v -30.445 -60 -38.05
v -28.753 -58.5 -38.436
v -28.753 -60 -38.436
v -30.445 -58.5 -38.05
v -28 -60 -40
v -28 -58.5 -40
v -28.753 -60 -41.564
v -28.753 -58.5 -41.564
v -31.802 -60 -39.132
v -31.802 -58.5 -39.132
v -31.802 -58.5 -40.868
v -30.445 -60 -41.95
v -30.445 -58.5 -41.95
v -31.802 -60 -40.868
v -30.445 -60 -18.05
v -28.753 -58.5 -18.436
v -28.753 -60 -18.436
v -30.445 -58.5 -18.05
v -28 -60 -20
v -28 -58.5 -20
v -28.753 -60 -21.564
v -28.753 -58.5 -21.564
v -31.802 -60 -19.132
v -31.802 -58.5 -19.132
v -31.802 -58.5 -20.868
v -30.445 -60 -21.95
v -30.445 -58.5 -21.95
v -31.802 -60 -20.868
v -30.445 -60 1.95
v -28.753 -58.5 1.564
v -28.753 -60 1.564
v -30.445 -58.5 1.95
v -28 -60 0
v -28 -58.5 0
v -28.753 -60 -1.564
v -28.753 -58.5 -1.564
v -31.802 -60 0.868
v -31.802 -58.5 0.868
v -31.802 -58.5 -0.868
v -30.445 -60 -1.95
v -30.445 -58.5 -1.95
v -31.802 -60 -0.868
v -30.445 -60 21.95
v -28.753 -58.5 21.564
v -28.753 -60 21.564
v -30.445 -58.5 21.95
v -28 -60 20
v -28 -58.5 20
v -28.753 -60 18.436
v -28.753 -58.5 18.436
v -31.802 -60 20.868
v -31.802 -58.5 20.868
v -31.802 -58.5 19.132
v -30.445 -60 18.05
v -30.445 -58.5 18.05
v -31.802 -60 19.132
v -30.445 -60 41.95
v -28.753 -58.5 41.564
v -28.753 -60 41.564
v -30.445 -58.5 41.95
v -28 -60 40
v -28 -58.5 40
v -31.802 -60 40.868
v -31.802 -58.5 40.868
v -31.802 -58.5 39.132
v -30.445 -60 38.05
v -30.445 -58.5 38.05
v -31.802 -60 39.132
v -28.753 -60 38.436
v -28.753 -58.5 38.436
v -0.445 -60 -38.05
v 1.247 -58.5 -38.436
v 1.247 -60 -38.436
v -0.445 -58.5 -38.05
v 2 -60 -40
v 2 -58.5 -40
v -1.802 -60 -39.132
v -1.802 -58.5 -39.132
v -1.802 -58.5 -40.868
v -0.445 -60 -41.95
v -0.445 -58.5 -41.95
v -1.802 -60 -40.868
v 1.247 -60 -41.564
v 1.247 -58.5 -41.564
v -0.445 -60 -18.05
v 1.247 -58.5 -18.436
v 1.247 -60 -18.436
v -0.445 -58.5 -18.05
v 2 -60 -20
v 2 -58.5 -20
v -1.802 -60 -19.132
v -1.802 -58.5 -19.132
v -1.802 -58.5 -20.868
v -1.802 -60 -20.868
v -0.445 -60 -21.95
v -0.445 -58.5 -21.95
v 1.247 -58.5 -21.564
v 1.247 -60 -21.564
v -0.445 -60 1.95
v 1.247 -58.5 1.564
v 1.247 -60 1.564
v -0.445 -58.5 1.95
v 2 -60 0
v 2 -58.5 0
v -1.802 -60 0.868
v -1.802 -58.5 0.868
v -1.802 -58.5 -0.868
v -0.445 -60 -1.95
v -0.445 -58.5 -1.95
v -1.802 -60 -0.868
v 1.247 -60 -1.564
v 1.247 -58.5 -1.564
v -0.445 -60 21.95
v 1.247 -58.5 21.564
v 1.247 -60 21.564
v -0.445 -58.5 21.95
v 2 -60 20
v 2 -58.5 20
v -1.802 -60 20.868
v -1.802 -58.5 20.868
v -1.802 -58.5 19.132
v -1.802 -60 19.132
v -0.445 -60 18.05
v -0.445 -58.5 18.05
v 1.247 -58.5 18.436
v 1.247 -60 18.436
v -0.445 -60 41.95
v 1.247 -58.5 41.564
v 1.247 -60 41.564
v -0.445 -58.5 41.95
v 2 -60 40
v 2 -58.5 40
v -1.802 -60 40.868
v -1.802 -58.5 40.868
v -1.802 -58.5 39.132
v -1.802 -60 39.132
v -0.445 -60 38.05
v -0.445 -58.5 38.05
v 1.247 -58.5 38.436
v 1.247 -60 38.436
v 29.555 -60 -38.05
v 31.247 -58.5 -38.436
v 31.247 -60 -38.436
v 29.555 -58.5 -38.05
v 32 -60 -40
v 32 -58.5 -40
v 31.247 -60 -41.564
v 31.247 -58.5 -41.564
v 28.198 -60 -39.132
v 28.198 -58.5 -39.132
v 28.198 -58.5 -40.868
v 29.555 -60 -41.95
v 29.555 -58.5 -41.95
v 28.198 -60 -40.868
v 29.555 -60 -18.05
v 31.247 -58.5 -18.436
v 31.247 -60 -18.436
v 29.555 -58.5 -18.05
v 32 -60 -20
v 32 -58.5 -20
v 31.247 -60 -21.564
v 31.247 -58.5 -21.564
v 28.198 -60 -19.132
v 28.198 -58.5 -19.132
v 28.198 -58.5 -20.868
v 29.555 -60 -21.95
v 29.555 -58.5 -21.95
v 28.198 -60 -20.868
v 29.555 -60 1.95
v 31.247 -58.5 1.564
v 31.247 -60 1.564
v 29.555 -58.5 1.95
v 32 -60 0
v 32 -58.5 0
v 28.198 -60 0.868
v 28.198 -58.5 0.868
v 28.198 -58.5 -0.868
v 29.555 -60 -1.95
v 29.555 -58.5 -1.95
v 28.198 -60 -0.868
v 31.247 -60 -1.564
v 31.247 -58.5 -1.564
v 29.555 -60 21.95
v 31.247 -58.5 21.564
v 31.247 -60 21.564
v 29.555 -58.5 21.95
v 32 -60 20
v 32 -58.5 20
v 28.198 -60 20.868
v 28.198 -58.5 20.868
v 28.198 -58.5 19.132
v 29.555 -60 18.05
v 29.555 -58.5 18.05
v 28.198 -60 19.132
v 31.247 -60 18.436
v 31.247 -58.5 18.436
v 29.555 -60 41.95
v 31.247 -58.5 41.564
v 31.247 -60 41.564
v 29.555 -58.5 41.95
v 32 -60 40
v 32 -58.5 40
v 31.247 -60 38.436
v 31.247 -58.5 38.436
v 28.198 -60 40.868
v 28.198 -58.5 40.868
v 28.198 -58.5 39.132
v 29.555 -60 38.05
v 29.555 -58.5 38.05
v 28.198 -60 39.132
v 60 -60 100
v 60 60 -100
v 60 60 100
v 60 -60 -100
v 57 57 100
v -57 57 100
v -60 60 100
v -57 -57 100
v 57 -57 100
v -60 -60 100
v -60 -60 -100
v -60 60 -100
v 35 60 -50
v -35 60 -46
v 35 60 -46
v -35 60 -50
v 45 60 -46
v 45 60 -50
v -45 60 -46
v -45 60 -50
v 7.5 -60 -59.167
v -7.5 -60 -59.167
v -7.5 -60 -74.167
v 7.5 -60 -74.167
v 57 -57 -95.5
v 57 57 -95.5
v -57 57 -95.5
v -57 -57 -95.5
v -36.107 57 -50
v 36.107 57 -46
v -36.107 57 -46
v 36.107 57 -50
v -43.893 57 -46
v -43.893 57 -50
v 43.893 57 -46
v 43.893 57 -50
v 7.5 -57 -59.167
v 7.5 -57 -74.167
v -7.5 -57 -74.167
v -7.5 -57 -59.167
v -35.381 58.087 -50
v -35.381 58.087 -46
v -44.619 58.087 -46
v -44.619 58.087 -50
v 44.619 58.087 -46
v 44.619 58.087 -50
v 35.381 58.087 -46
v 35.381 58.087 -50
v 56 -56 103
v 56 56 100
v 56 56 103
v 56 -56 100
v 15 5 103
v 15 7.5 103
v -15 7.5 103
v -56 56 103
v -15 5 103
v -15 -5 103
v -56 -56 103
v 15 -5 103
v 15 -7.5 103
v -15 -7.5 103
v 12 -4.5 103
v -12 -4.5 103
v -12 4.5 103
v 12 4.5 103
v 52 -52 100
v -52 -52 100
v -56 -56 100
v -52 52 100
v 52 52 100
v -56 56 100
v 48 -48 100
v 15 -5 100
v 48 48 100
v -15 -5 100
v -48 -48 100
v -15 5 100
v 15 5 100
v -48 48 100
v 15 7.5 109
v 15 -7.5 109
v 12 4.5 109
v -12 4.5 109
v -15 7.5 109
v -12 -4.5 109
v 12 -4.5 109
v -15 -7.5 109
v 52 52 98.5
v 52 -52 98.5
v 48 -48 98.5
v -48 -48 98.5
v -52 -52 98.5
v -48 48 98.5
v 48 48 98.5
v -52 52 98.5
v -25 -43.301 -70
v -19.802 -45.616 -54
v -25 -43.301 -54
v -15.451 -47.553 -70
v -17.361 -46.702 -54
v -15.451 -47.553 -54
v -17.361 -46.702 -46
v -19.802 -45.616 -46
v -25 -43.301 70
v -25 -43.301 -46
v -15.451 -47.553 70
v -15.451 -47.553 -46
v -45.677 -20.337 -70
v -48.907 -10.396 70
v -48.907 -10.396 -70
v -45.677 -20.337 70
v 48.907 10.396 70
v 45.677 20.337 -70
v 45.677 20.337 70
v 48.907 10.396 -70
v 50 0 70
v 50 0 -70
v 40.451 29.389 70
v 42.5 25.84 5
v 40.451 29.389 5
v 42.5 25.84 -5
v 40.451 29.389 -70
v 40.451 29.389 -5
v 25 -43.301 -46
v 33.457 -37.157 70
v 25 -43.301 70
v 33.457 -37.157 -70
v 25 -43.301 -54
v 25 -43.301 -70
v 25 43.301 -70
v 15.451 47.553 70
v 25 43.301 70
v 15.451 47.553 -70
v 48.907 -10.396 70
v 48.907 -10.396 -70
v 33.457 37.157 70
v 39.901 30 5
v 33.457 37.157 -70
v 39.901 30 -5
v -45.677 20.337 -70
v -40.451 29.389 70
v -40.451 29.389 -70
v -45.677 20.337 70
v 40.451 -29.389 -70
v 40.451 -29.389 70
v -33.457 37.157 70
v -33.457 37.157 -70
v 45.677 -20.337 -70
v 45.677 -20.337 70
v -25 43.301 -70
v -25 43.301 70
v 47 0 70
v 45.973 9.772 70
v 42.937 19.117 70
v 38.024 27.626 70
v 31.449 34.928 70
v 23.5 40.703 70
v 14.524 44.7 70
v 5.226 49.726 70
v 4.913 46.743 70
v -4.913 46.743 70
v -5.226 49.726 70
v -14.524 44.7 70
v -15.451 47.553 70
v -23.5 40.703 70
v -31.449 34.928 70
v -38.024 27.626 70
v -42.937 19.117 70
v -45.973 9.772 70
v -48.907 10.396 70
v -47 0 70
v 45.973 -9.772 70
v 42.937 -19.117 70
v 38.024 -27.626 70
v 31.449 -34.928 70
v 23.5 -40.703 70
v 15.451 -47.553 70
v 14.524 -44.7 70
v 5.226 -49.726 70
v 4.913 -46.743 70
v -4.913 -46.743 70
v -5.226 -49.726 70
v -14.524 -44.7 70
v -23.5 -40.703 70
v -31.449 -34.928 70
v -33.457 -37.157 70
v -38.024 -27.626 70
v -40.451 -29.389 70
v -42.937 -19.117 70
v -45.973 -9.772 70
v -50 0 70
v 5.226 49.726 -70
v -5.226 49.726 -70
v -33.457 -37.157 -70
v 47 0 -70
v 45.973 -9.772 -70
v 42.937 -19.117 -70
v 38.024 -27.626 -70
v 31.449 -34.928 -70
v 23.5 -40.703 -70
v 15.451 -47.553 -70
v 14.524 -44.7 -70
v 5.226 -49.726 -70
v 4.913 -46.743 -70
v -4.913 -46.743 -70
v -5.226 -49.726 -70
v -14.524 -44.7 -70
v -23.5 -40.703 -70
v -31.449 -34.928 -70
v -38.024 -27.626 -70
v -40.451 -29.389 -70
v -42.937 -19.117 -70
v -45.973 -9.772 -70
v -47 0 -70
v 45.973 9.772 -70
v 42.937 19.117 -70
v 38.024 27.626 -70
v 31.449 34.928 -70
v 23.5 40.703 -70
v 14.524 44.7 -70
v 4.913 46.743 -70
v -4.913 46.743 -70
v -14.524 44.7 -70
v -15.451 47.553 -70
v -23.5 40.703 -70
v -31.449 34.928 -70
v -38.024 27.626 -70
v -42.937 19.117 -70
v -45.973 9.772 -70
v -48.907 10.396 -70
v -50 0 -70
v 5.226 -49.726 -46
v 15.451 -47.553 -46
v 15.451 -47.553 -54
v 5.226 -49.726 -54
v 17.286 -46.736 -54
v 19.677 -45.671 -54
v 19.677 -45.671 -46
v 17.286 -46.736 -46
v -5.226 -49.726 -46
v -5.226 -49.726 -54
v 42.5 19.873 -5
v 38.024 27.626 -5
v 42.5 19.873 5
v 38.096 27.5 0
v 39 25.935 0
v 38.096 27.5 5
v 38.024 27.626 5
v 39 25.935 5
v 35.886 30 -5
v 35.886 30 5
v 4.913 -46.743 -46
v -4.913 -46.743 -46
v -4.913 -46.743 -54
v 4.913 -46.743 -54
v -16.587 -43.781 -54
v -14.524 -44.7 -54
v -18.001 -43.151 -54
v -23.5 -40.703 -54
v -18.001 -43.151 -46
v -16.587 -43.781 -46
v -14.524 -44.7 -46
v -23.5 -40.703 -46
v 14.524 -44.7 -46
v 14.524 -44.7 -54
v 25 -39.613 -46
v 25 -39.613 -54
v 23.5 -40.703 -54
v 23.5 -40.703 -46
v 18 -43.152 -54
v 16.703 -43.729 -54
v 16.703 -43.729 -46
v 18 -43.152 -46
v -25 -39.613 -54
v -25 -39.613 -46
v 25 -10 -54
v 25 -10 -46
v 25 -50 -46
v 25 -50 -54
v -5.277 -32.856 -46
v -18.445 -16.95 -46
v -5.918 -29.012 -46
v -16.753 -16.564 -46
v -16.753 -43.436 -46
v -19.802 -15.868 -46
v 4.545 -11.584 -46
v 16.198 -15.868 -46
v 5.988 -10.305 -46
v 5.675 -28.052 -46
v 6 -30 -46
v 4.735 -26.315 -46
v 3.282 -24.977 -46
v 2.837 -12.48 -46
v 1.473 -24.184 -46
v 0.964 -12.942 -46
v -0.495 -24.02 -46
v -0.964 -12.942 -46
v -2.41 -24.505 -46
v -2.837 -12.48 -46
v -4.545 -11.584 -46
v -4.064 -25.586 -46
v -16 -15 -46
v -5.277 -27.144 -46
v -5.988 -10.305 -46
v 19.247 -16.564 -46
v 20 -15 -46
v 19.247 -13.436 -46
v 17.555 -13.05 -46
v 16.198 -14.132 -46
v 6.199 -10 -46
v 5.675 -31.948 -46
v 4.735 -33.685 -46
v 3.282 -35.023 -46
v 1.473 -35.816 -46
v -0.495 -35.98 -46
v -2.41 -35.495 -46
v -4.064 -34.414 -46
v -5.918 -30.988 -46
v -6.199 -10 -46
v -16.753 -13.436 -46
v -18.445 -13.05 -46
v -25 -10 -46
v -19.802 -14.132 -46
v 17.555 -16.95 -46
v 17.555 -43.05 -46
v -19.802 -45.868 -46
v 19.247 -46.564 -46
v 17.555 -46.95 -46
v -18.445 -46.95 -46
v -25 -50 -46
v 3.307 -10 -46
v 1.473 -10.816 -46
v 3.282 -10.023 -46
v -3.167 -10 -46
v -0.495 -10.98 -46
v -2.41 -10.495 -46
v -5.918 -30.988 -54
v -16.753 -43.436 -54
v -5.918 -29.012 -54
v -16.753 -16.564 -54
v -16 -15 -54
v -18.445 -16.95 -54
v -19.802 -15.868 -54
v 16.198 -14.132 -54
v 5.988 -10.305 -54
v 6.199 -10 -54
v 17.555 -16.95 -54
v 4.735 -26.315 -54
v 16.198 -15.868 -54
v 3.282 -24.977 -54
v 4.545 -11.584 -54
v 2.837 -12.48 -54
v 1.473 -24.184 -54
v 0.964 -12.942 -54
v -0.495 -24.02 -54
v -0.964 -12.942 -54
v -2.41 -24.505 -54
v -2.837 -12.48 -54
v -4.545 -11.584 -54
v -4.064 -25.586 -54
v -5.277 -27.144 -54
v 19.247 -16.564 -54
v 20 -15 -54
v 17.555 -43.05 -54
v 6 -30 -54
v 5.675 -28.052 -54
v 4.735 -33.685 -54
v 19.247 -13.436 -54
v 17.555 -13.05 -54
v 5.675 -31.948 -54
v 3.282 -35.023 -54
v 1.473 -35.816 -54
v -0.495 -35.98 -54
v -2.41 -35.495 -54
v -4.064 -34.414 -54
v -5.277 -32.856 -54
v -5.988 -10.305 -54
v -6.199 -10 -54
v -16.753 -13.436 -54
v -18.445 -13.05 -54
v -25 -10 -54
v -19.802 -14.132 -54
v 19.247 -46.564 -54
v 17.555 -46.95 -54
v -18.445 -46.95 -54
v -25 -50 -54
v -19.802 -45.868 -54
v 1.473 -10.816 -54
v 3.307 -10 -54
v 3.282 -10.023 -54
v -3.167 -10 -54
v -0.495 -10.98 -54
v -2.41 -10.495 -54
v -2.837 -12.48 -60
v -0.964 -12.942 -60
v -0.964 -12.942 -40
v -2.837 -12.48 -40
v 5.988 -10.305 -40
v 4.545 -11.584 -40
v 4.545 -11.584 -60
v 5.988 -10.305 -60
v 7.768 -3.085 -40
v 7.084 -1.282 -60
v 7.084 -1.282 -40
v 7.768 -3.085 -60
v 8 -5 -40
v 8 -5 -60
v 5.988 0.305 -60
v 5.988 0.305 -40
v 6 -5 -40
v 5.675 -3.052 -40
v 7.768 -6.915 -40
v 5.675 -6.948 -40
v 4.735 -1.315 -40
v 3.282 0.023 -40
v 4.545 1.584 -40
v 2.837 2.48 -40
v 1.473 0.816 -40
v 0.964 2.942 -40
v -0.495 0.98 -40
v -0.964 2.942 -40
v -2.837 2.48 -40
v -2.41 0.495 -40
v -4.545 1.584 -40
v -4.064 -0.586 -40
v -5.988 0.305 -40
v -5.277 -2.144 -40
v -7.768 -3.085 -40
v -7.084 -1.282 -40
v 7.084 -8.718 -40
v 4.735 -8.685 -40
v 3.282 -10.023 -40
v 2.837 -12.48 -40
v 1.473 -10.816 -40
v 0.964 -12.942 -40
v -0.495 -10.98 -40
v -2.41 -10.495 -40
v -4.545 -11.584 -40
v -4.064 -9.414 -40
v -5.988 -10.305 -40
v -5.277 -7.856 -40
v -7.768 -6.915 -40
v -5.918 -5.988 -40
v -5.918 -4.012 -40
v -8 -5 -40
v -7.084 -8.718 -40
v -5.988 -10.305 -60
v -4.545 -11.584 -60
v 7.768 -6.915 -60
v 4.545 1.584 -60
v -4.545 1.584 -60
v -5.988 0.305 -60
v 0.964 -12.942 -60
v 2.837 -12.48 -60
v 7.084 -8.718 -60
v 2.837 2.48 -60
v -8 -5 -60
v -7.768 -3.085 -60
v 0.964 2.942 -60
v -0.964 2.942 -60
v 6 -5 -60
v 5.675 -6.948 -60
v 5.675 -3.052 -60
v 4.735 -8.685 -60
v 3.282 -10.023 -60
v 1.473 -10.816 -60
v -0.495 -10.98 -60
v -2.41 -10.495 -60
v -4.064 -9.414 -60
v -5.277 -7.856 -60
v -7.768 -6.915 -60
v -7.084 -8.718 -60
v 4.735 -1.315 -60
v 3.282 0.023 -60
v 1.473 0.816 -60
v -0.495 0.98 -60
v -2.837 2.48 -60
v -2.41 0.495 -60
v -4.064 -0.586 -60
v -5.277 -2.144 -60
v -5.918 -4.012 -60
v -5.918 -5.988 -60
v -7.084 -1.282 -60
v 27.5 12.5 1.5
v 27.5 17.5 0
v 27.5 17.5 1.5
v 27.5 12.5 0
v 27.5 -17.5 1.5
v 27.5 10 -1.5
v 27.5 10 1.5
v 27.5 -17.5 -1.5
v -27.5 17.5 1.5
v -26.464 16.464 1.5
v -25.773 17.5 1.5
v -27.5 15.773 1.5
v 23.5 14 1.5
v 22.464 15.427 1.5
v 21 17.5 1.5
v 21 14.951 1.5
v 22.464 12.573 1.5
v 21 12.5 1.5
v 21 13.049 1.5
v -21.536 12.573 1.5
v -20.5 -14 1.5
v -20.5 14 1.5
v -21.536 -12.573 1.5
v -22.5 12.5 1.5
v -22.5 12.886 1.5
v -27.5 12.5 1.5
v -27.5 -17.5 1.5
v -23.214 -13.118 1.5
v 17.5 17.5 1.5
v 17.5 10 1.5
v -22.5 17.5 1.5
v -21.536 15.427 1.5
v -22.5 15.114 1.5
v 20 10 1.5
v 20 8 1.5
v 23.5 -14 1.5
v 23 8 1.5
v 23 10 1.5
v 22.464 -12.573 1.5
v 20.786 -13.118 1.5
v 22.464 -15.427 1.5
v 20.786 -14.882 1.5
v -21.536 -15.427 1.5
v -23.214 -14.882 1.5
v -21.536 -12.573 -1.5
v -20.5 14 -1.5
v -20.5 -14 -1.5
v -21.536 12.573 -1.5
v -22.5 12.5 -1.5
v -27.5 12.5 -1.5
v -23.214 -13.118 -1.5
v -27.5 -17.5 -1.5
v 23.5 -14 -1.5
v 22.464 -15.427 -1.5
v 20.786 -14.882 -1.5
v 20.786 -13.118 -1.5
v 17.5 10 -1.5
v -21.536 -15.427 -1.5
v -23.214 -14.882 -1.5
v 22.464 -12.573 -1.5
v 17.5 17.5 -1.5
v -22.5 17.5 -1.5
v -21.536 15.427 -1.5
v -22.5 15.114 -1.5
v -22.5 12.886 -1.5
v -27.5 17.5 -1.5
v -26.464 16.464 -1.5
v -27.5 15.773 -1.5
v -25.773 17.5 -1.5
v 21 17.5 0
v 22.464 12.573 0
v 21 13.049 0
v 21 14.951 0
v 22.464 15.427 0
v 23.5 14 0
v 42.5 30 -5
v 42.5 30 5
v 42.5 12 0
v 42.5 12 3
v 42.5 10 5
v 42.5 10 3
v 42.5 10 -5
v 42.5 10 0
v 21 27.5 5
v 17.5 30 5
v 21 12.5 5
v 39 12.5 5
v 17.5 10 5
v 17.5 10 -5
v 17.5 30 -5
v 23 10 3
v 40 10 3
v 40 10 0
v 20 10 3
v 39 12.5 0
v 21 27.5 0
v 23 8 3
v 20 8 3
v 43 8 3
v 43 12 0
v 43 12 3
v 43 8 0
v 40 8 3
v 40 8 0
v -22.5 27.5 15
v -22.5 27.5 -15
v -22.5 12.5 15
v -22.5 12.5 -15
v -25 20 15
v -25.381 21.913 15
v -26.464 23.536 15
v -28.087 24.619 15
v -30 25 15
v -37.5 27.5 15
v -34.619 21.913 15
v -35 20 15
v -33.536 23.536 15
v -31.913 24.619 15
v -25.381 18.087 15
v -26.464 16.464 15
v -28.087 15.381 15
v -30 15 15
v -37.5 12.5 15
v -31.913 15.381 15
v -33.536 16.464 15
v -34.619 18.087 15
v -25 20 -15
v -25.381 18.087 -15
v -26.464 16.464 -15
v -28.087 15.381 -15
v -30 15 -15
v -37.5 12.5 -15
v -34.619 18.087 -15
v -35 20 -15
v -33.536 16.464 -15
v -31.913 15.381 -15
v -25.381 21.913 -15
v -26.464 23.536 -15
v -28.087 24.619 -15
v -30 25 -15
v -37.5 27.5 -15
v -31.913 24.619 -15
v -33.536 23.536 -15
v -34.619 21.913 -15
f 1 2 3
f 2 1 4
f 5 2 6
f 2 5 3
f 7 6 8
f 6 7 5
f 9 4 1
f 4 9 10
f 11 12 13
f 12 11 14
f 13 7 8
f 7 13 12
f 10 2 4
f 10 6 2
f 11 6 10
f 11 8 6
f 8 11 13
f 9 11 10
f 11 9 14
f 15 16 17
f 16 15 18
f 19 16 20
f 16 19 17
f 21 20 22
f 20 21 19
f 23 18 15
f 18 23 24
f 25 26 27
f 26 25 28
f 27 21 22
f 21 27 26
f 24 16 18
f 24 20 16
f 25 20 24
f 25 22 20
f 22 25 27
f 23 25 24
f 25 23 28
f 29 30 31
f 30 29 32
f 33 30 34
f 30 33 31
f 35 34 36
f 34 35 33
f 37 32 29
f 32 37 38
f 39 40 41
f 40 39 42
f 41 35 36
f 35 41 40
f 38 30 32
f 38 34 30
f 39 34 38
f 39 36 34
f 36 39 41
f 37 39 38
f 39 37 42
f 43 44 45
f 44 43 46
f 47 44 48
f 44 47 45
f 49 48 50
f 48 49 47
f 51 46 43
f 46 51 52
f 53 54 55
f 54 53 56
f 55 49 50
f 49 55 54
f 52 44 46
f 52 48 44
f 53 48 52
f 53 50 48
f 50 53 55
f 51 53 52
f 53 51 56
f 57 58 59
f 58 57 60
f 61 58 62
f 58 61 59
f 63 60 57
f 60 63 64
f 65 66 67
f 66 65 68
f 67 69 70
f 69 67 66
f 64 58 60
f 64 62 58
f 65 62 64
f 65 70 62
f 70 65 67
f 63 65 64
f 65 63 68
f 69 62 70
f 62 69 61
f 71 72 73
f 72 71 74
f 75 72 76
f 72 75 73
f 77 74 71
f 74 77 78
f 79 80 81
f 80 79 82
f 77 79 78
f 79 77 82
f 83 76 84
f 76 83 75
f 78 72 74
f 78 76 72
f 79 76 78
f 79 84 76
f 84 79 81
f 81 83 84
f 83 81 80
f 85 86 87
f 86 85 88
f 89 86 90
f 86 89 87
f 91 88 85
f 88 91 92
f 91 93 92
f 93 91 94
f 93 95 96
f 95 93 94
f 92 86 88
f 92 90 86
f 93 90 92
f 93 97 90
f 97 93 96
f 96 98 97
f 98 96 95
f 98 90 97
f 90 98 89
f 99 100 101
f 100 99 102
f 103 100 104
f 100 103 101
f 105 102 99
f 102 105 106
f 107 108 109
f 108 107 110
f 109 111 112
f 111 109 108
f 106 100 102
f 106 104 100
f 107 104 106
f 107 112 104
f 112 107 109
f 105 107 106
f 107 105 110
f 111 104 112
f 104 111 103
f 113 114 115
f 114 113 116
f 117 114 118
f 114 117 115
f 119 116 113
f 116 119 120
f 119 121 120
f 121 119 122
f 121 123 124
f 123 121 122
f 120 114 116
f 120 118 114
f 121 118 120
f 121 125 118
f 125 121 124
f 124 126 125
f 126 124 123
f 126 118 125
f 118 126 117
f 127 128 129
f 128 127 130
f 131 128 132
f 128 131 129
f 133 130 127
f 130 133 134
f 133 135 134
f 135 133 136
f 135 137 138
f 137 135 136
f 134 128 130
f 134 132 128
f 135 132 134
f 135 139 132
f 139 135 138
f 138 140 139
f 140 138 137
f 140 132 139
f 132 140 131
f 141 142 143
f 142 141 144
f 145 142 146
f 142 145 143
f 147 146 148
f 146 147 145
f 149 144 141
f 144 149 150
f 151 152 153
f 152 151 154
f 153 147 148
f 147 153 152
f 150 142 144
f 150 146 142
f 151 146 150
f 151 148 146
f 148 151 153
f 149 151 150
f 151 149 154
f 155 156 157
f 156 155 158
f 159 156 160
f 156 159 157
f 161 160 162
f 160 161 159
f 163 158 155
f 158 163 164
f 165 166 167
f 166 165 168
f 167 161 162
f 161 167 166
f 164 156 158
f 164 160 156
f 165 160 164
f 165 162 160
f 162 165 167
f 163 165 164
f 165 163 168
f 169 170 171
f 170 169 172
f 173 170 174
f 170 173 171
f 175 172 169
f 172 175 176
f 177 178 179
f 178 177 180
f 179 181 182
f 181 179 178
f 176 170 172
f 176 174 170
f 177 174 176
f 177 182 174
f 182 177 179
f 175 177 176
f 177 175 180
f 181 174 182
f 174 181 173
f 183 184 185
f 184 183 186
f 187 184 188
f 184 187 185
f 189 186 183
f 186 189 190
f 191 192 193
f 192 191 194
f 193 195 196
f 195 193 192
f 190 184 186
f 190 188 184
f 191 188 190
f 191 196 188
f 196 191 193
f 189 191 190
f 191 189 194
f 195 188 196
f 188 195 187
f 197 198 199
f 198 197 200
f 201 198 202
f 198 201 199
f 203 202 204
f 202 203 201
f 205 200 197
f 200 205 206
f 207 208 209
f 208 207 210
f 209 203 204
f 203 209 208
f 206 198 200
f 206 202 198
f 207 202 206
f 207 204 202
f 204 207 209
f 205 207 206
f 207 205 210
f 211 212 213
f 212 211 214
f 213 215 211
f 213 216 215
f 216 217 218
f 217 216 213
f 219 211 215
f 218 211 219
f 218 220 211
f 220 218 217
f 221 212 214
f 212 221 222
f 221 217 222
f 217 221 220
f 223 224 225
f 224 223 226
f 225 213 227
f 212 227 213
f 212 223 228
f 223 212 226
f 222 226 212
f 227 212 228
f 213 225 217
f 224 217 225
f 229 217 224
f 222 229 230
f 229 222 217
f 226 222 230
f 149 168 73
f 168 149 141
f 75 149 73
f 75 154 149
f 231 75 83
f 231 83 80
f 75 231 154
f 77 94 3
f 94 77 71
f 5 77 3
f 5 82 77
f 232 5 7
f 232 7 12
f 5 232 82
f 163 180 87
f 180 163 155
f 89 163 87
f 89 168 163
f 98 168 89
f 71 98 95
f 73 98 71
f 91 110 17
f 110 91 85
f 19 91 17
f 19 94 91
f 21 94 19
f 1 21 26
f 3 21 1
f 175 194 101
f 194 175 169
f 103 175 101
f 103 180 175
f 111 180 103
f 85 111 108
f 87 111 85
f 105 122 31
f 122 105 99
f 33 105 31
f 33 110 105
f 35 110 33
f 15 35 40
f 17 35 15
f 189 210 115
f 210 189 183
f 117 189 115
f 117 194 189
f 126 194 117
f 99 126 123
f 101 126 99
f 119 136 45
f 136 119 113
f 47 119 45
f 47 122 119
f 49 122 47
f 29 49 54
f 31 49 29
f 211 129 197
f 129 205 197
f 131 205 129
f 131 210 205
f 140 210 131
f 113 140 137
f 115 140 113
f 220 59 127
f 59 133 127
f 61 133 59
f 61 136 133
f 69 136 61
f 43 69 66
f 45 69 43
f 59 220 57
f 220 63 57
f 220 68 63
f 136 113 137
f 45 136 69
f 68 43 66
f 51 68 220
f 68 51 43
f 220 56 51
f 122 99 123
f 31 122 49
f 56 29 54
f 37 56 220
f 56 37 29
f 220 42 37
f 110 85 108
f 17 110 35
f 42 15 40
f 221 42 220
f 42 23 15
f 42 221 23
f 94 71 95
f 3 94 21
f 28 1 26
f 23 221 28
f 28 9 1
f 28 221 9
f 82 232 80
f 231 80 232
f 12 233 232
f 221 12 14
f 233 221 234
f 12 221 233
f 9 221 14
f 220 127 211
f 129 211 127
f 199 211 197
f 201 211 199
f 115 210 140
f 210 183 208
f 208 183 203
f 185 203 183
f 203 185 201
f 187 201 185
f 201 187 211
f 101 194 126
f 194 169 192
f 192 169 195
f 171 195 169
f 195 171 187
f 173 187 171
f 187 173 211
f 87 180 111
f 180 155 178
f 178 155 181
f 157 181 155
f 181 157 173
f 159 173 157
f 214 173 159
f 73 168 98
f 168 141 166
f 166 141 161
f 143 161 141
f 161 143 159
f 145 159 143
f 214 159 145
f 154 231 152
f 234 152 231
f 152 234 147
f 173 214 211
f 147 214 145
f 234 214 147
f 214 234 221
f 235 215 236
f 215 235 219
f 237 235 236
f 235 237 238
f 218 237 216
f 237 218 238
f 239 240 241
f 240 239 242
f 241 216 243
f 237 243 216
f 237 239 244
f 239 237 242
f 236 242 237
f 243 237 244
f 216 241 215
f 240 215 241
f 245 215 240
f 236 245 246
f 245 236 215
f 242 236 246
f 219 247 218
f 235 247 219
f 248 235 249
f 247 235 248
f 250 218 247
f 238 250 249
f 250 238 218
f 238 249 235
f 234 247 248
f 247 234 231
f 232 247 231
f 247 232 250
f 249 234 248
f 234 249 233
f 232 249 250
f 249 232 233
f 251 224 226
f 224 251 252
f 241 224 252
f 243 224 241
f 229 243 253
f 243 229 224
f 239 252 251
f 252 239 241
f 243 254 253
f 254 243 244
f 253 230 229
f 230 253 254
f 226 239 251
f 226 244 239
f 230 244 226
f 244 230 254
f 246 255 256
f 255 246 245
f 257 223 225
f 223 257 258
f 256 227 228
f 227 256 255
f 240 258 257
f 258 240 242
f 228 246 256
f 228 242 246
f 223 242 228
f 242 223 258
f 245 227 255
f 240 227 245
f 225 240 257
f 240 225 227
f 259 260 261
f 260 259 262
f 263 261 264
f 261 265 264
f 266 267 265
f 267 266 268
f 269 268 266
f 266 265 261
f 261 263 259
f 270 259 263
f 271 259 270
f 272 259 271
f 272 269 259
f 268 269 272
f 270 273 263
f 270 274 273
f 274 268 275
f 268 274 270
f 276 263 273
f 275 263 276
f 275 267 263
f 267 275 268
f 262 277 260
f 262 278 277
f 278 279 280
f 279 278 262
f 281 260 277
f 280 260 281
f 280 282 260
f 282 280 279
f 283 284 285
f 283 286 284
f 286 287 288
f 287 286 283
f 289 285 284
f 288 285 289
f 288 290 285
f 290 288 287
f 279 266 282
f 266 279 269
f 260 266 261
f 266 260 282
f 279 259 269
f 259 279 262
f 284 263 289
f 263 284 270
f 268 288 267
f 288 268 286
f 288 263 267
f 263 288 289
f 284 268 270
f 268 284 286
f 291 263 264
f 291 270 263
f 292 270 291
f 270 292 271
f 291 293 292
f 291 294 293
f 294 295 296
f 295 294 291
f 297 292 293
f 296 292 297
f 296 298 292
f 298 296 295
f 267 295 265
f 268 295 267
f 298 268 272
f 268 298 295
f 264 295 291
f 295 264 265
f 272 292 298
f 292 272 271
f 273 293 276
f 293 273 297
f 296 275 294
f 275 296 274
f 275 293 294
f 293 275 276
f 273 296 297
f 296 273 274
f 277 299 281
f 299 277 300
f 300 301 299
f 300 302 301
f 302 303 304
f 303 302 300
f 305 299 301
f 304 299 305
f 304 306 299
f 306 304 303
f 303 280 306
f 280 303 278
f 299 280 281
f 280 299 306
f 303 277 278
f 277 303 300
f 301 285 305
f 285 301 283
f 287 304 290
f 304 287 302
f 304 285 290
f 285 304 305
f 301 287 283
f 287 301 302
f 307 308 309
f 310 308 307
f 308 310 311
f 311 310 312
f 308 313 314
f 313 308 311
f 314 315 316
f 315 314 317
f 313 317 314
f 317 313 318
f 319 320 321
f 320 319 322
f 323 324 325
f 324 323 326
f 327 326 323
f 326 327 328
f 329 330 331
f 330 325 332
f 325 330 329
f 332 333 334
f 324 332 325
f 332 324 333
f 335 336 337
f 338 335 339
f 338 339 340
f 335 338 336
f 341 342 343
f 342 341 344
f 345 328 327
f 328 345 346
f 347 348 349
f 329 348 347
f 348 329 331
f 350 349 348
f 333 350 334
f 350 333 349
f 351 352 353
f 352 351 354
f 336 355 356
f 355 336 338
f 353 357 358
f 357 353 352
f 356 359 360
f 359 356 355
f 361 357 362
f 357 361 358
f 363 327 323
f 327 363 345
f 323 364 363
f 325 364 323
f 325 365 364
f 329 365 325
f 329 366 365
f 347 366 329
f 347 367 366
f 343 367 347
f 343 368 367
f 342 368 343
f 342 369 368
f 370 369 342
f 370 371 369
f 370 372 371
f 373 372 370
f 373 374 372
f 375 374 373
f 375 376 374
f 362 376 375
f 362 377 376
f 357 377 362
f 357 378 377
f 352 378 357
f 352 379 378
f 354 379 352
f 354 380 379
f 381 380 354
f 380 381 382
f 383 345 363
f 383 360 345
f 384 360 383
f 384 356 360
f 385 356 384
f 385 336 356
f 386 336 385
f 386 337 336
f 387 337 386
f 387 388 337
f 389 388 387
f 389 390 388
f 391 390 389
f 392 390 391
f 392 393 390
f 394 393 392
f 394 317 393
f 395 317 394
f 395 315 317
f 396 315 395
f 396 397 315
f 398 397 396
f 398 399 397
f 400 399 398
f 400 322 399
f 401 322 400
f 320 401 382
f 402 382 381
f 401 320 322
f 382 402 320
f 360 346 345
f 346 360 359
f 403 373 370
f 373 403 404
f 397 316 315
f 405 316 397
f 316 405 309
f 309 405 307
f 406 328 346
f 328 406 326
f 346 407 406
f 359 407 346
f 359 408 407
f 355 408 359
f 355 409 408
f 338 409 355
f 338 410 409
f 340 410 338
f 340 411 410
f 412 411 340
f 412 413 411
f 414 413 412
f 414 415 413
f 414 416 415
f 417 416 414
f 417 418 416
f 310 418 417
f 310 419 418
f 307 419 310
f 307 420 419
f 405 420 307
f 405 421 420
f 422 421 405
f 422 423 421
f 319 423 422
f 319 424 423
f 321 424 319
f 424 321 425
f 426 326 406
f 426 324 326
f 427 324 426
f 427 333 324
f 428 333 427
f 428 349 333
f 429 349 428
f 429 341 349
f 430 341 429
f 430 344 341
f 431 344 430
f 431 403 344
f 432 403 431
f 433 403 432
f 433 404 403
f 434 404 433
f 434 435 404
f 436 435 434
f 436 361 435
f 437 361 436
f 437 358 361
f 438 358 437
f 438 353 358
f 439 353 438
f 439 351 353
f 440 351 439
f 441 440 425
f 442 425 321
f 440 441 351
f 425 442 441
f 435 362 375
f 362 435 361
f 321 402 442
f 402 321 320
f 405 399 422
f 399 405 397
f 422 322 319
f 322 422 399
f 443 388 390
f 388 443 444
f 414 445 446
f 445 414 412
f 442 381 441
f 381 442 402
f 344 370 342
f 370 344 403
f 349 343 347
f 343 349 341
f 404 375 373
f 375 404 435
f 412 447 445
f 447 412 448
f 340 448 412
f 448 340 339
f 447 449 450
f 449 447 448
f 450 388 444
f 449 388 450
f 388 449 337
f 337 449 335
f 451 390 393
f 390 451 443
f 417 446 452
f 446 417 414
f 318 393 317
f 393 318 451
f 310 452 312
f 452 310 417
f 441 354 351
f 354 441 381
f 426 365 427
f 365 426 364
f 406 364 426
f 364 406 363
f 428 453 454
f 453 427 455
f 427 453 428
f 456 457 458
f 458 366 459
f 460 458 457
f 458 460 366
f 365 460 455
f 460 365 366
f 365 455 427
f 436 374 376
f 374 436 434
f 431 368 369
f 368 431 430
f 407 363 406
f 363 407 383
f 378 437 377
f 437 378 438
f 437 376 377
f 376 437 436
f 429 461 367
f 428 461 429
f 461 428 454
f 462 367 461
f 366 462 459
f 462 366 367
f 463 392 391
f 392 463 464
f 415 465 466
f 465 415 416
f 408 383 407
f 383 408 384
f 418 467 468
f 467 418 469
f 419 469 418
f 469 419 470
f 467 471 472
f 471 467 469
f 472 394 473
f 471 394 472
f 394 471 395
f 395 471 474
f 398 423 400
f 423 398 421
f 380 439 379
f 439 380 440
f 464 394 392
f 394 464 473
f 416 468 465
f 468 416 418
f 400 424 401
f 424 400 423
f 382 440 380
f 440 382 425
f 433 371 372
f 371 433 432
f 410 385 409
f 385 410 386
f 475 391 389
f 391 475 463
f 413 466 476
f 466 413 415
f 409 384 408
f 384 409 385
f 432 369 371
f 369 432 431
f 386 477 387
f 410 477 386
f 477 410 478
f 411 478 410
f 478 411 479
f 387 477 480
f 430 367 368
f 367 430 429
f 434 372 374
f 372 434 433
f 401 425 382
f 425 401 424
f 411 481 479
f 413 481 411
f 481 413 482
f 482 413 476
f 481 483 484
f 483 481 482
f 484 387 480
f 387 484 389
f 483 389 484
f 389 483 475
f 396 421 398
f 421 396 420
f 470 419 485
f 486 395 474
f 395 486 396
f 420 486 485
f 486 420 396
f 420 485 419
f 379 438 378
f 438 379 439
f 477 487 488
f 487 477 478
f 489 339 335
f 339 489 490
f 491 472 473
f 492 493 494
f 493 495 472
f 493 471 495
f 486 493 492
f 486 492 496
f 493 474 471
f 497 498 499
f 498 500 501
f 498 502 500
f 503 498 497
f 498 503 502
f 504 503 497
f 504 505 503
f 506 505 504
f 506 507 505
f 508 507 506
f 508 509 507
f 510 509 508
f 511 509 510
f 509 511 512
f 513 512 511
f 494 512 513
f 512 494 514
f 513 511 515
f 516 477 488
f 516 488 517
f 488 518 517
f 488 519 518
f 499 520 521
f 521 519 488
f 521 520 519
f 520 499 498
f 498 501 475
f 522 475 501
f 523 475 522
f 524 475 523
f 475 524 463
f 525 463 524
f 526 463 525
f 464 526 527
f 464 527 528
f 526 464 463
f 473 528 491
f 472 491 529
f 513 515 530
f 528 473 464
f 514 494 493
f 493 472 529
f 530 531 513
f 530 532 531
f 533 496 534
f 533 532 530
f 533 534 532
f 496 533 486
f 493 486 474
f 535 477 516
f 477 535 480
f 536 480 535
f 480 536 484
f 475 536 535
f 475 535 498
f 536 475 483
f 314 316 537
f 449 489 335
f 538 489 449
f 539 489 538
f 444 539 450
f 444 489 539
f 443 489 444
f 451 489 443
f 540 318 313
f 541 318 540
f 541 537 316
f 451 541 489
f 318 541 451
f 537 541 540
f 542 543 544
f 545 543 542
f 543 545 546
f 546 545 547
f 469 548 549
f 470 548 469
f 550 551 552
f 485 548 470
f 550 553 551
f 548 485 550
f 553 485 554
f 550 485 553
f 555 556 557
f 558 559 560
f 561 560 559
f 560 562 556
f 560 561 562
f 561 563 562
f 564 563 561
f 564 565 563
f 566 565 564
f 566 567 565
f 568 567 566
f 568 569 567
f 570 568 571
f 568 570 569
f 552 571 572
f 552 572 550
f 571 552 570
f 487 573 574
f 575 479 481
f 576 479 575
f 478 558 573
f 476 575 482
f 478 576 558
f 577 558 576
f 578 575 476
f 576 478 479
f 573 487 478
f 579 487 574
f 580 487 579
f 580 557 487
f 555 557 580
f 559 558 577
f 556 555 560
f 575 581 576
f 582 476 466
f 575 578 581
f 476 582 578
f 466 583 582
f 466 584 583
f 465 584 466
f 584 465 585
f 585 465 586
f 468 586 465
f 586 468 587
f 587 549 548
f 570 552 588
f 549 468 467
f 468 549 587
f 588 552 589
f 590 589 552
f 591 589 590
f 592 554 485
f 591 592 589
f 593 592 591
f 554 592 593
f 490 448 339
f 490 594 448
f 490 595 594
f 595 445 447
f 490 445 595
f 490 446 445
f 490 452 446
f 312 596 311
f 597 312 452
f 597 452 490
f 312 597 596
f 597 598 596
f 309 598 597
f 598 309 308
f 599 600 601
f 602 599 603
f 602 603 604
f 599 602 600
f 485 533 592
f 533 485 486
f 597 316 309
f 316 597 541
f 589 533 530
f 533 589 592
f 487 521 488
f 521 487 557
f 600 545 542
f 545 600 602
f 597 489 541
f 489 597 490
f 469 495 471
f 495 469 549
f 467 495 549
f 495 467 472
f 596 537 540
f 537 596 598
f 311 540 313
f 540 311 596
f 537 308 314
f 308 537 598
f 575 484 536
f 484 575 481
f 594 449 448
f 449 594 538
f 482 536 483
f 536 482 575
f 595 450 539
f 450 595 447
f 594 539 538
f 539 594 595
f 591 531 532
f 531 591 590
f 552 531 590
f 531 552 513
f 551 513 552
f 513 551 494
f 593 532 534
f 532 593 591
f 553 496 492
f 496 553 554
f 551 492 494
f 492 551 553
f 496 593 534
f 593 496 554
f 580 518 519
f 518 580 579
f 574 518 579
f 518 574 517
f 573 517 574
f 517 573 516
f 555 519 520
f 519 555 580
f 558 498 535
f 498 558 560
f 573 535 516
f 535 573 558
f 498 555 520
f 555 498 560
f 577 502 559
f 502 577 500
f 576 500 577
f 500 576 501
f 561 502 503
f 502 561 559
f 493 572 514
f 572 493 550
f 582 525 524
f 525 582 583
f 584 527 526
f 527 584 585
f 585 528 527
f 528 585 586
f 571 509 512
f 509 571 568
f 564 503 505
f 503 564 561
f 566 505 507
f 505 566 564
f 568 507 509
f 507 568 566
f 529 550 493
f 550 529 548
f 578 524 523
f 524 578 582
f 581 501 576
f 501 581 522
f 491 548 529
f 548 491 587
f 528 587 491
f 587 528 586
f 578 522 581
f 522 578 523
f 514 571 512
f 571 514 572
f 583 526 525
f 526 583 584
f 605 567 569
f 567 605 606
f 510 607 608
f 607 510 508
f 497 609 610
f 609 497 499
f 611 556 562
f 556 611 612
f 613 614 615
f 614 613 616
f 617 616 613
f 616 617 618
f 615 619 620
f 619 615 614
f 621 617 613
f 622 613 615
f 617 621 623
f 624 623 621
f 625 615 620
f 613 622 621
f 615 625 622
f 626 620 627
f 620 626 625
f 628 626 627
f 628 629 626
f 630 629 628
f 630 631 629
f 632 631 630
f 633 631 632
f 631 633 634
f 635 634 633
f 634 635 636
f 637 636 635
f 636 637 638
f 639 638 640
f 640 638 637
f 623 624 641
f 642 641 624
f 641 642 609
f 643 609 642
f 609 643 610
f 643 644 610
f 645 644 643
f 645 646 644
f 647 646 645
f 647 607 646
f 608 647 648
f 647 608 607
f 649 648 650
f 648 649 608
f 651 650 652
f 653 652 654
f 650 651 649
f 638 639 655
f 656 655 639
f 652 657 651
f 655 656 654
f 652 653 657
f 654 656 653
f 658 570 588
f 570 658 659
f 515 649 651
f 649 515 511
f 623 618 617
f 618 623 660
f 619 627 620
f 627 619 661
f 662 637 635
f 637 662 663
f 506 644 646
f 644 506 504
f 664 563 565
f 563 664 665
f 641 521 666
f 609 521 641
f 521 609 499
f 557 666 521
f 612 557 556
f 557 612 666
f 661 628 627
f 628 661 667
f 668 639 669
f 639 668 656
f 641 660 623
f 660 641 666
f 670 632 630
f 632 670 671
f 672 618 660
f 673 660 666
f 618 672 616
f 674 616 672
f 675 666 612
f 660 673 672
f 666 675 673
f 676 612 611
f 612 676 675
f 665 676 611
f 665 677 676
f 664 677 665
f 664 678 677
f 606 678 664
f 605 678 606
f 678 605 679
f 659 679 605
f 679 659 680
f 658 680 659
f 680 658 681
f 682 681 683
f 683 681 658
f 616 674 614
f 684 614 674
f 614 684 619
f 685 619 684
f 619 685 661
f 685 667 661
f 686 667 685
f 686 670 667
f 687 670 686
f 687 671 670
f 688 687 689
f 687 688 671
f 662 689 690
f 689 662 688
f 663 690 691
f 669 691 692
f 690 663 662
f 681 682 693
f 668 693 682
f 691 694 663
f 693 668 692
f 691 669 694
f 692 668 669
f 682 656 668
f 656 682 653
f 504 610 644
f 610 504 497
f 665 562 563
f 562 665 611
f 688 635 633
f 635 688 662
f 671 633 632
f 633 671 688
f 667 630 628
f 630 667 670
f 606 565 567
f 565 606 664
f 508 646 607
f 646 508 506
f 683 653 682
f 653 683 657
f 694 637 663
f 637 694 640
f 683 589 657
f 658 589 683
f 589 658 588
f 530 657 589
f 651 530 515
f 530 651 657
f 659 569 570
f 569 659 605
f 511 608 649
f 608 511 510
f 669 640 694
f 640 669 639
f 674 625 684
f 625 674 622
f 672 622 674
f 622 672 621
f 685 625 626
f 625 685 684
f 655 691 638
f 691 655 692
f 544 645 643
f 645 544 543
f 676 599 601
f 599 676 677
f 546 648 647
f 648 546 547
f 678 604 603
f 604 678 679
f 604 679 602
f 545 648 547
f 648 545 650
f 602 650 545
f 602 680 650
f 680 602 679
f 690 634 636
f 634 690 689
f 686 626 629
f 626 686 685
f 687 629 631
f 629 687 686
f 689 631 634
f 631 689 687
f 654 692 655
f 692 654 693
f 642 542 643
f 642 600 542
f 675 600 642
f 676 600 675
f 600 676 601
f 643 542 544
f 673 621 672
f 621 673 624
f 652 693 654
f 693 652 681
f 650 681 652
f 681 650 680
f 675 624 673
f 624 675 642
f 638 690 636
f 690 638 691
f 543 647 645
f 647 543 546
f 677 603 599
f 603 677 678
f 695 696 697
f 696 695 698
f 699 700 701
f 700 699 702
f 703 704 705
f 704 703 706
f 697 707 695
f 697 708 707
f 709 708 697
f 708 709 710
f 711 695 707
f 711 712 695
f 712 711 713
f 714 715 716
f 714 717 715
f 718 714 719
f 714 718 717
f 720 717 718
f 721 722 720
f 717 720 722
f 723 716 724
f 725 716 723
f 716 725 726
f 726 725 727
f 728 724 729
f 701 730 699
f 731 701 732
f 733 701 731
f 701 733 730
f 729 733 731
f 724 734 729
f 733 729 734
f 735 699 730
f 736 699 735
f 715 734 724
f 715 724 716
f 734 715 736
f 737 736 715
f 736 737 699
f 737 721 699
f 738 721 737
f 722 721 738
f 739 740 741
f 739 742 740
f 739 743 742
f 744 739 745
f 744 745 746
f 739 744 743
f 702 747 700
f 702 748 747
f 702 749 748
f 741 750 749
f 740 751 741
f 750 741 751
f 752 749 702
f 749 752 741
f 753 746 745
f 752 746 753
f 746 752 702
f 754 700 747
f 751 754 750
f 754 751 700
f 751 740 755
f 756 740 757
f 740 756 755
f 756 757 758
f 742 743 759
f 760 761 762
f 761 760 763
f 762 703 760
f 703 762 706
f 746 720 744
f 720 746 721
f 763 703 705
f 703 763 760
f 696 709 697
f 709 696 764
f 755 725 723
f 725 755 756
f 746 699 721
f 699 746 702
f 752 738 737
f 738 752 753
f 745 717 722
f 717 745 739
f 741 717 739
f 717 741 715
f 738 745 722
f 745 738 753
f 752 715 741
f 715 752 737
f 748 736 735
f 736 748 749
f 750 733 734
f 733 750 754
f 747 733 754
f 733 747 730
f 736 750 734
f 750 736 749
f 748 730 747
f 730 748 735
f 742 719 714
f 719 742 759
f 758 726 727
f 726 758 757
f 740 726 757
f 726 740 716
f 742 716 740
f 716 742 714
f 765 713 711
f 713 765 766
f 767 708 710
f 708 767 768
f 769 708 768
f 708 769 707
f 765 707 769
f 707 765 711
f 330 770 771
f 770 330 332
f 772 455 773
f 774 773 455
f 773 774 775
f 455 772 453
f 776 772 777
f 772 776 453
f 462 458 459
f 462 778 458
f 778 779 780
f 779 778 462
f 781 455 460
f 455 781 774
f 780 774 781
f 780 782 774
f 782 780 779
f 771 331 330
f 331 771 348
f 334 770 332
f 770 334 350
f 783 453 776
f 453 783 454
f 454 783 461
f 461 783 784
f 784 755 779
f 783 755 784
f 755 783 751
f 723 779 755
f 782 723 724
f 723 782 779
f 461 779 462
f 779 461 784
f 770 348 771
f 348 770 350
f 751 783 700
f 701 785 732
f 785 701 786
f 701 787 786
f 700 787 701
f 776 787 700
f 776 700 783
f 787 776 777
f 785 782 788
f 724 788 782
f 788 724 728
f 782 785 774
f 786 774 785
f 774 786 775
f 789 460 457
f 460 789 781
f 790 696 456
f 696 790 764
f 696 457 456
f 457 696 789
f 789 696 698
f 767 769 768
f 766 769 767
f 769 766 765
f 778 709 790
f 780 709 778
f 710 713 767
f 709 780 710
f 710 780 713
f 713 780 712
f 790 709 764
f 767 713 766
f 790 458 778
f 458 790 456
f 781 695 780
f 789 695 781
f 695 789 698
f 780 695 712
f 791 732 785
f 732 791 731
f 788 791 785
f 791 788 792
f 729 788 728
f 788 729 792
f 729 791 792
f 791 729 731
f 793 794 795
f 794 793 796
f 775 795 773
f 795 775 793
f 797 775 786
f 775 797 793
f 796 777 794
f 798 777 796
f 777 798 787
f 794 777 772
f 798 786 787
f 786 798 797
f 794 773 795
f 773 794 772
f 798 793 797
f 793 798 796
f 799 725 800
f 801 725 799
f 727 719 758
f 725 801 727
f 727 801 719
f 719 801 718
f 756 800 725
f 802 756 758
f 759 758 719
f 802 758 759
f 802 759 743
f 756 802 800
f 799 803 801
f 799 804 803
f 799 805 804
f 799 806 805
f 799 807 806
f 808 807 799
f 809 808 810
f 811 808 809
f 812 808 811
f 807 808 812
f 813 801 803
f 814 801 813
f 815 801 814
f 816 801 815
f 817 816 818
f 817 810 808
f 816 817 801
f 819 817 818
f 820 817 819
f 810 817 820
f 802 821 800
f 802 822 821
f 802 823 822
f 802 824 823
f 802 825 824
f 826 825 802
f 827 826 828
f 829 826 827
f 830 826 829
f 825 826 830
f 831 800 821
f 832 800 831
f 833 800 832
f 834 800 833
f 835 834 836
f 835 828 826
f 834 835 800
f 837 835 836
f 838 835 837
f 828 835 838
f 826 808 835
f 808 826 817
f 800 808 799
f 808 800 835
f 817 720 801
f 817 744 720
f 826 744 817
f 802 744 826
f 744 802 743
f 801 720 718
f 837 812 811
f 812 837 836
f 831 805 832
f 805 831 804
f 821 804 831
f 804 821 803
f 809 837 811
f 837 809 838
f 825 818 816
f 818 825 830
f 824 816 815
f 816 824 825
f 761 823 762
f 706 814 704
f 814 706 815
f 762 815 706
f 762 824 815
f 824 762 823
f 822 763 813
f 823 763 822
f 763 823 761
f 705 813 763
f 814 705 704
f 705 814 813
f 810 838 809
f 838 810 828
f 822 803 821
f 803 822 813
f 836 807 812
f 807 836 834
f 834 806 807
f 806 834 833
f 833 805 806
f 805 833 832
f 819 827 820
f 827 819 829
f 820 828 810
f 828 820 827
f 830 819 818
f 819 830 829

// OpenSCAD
/**
 * Smart Pet Water Dispenser - 3D Enclosure Design
 * OpenSCAD script
 * 
 * Features:
 * - Water pump mount
 * - Water reservoir
 * - Ultrasonic sensor mount for level detection
 * - TDS sensor mount
 * - ESP32 microcontroller placement
 * - Removable lid
 * - Drain valve option
 */

// ============== PARAMETERS ==============
WATER_WIDTH = 120;    // mm
WATER_DEPTH = 120;    // mm
WATER_HEIGHT = 200;   // mm (taller for water column)
WALL_THICKNESS = 3;   // mm
RESERVOIR_DIAMETER = 100; // mm
PUMP_MOUNT_HOLE = 12; // mm (for typical water pump)

// ============== WATER RESERVOIR ==============
module water_reservoir() {
  difference() {
    // Outer cylinder
    cylinder(r = RESERVOIR_DIAMETER / 2, h = WATER_HEIGHT * 0.7, center = true);
    
    // Inner cavity
    cylinder(r = RESERVOIR_DIAMETER / 2 - WALL_THICKNESS, h = WATER_HEIGHT * 0.7 + 1, center = true);
  }
}

// ============== PUMP MOUNT ==============
module pump_mount() {
  // Pump base plate
  difference() {
    cube([50, 40, 8], center = true);
    
    // Mounting holes (4 corners)
    translate([-18, -15, 0]) cylinder(r = 2, h = 10, center = true);
    translate([18, -15, 0]) cylinder(r = 2, h = 10, center = true);
    translate([-18, 15, 0]) cylinder(r = 2, h = 10, center = true);
    translate([18, 15, 0]) cylinder(r = 2, h = 10, center = true);
    
    // Center hole for pump
    cylinder(r = PUMP_MOUNT_HOLE / 2, h = 10, center = true);
  }
  
  // Outlet pipe
  translate([0, 25, 0]) {
    difference() {
      cylinder(r = 8, h = 20, center = true);
      cylinder(r = 6, h = 25, center = true);
    }
  }
}

// ============== WATER LEVEL SENSOR MOUNT ==============
module sensor_mount() {
  // Bracket for HC-SR04
  difference() {
    cube([25, 20, 10], center = true);
    // Sensor cutout
    translate([0, 0, 5]) cube([18, 15, 10], center = true);
  }
  
  // Mounting tabs
  translate([-10, -12, 0]) cube([3, 4, 3]);
  translate([10, -12, 0]) cube([3, 4, 3]);
}

// ============== TDS SENSOR HOUSING ==============
module tds_sensor_mount() {
  // Housing for TDS probe
  difference() {
    cube([15, 15, 30], center = true);
    // Probe hole (10mm diameter)
    cylinder(r = 5, h = 35, center = true);
  }
}

// ============== ESP32 MOUNT ==============
module esp32_mount() {
  difference() {
    cube([55, 35, 3], center = true);
    translate([-22, -14, 0]) cylinder(r = 1.5, h = 5, center = true);
    translate([22, -14, 0]) cylinder(r = 1.5, h = 5, center = true);
    translate([-22, 14, 0]) cylinder(r = 1.5, h = 5, center = true);
    translate([22, 14, 0]) cylinder(r = 1.5, h = 5, center = true);
  }
}

// ============== MAIN ENCLOSURE ==============
module main_enclosure() {
  difference() {
    // Outer shell
    cube([WATER_WIDTH, WATER_DEPTH, WATER_HEIGHT], center = true);
    
    // Inner cavity
    translate([0, 0, WALL_THICKNESS]) {
      cube([
        WATER_WIDTH - 2 * WALL_THICKNESS,
        WATER_DEPTH - 2 * WALL_THICKNESS,
        WATER_HEIGHT - WALL_THICKNESS
      ], center = true);
    }
    
    // Lid opening
    translate([0, 0, WATER_HEIGHT / 2 - 5]) {
      cube([WATER_WIDTH - 10, WATER_DEPTH - 10, 10], center = true);
    }
    
    // Reservoir opening (top)
    translate([0, 0, WATER_HEIGHT * 0.15]) {
      cylinder(r = RESERVOIR_DIAMETER / 2 - WALL_THICKNESS, h = 20, center = true);
    }
    
    // Drain valve opening (bottom front)
    translate([0, -WATER_DEPTH / 2 + WALL_THICKNESS, -WATER_HEIGHT / 3]) {
      cube([15, 10, 15], center = true);
    }
    
    // Ventilation
    for (i = [-30, 0, 30]) {
      for (j = [-40, -20, 0, 20, 40]) {
        translate([i, -WATER_DEPTH / 2 + WALL_THICKNESS / 2, j]) {
          rotate([90, 0, 0]) cylinder(r = 2, h = WALL_THICKNESS + 1);
        }
      }
    }
    
    // Cable grommets
    translate([-40, WATER_DEPTH / 2, -50]) cylinder(r = 5, h = WALL_THICKNESS + 1);
    translate([40, WATER_DEPTH / 2, -50]) cylinder(r = 5, h = WALL_THICKNESS + 1);
  }
}

// ============== REMOVABLE LID ==============
module removable_lid() {
  difference() {
    cube([WATER_WIDTH - 8, WATER_DEPTH - 8, WALL_THICKNESS], center = true);
    translate([0, 0, 0]) cube([30, 10, WALL_THICKNESS + 2], center = true);
  }
  
  // Handle
  translate([0, 0, WALL_THICKNESS / 2 + 3]) {
    difference() {
      cube([30, 15, 6], center = true);
      cube([24, 9, 10], center = true);
    }
  }
  
  // Sealing ring groove
  translate([0, 0, -WALL_THICKNESS / 2]) {
    difference() {
      cube([WATER_WIDTH - 16, WATER_DEPTH - 16, 3], center = true);
      cube([WATER_WIDTH - 24, WATER_DEPTH - 24, 10], center = true);
    }
  }
}

// ============== ASSEMBLY VIEW ==============
module assembly() {
  // Main enclosure
  color([0.6, 0.7, 0.9]) main_enclosure();
  
  // Lid
  color([0.5, 0.6, 0.8]) translate([0, 0, WATER_HEIGHT / 2 + WALL_THICKNESS / 2]) {
    removable_lid();
  }
  
  // Reservoir (inside)
  color([0.7, 0.8, 1.0, 0.5]) translate([0, 0, 0]) {
    water_reservoir();
  }
  
  // Pump mount
  color([0.3, 0.3, 0.3]) translate([0, -WATER_DEPTH / 4, -WATER_HEIGHT / 4]) {
    pump_mount();
  }
  
  // ESP32 mount
  color([0.2, 0.2, 0.5]) translate([0, -WATER_DEPTH / 4 + 30, 0]) {
    esp32_mount();
  }
  
  // Sensor mount
  color([0.2, 0.2, 0.2]) translate([30, WATER_DEPTH / 4 - 10, 0]) {
    sensor_mount();
  }
  
  // TDS sensor
  color([0.4, 0.4, 0.4]) translate([-30, WATER_DEPTH / 4 - 10, 0]) {
    tds_sensor_mount();
  }
}

// Render the assembly
assembly();

// ============== DIMENSIONS ==============
echo("Water Dispenser Dimensions:");
echo(str("Width: ", WATER_WIDTH, "mm"));
echo(str("Depth: ", WATER_DEPTH, "mm"));
echo(str("Height: ", WATER_HEIGHT, "mm"));
echo(str("Reservoir Diameter: ", RESERVOIR_DIAMETER, "mm"));
